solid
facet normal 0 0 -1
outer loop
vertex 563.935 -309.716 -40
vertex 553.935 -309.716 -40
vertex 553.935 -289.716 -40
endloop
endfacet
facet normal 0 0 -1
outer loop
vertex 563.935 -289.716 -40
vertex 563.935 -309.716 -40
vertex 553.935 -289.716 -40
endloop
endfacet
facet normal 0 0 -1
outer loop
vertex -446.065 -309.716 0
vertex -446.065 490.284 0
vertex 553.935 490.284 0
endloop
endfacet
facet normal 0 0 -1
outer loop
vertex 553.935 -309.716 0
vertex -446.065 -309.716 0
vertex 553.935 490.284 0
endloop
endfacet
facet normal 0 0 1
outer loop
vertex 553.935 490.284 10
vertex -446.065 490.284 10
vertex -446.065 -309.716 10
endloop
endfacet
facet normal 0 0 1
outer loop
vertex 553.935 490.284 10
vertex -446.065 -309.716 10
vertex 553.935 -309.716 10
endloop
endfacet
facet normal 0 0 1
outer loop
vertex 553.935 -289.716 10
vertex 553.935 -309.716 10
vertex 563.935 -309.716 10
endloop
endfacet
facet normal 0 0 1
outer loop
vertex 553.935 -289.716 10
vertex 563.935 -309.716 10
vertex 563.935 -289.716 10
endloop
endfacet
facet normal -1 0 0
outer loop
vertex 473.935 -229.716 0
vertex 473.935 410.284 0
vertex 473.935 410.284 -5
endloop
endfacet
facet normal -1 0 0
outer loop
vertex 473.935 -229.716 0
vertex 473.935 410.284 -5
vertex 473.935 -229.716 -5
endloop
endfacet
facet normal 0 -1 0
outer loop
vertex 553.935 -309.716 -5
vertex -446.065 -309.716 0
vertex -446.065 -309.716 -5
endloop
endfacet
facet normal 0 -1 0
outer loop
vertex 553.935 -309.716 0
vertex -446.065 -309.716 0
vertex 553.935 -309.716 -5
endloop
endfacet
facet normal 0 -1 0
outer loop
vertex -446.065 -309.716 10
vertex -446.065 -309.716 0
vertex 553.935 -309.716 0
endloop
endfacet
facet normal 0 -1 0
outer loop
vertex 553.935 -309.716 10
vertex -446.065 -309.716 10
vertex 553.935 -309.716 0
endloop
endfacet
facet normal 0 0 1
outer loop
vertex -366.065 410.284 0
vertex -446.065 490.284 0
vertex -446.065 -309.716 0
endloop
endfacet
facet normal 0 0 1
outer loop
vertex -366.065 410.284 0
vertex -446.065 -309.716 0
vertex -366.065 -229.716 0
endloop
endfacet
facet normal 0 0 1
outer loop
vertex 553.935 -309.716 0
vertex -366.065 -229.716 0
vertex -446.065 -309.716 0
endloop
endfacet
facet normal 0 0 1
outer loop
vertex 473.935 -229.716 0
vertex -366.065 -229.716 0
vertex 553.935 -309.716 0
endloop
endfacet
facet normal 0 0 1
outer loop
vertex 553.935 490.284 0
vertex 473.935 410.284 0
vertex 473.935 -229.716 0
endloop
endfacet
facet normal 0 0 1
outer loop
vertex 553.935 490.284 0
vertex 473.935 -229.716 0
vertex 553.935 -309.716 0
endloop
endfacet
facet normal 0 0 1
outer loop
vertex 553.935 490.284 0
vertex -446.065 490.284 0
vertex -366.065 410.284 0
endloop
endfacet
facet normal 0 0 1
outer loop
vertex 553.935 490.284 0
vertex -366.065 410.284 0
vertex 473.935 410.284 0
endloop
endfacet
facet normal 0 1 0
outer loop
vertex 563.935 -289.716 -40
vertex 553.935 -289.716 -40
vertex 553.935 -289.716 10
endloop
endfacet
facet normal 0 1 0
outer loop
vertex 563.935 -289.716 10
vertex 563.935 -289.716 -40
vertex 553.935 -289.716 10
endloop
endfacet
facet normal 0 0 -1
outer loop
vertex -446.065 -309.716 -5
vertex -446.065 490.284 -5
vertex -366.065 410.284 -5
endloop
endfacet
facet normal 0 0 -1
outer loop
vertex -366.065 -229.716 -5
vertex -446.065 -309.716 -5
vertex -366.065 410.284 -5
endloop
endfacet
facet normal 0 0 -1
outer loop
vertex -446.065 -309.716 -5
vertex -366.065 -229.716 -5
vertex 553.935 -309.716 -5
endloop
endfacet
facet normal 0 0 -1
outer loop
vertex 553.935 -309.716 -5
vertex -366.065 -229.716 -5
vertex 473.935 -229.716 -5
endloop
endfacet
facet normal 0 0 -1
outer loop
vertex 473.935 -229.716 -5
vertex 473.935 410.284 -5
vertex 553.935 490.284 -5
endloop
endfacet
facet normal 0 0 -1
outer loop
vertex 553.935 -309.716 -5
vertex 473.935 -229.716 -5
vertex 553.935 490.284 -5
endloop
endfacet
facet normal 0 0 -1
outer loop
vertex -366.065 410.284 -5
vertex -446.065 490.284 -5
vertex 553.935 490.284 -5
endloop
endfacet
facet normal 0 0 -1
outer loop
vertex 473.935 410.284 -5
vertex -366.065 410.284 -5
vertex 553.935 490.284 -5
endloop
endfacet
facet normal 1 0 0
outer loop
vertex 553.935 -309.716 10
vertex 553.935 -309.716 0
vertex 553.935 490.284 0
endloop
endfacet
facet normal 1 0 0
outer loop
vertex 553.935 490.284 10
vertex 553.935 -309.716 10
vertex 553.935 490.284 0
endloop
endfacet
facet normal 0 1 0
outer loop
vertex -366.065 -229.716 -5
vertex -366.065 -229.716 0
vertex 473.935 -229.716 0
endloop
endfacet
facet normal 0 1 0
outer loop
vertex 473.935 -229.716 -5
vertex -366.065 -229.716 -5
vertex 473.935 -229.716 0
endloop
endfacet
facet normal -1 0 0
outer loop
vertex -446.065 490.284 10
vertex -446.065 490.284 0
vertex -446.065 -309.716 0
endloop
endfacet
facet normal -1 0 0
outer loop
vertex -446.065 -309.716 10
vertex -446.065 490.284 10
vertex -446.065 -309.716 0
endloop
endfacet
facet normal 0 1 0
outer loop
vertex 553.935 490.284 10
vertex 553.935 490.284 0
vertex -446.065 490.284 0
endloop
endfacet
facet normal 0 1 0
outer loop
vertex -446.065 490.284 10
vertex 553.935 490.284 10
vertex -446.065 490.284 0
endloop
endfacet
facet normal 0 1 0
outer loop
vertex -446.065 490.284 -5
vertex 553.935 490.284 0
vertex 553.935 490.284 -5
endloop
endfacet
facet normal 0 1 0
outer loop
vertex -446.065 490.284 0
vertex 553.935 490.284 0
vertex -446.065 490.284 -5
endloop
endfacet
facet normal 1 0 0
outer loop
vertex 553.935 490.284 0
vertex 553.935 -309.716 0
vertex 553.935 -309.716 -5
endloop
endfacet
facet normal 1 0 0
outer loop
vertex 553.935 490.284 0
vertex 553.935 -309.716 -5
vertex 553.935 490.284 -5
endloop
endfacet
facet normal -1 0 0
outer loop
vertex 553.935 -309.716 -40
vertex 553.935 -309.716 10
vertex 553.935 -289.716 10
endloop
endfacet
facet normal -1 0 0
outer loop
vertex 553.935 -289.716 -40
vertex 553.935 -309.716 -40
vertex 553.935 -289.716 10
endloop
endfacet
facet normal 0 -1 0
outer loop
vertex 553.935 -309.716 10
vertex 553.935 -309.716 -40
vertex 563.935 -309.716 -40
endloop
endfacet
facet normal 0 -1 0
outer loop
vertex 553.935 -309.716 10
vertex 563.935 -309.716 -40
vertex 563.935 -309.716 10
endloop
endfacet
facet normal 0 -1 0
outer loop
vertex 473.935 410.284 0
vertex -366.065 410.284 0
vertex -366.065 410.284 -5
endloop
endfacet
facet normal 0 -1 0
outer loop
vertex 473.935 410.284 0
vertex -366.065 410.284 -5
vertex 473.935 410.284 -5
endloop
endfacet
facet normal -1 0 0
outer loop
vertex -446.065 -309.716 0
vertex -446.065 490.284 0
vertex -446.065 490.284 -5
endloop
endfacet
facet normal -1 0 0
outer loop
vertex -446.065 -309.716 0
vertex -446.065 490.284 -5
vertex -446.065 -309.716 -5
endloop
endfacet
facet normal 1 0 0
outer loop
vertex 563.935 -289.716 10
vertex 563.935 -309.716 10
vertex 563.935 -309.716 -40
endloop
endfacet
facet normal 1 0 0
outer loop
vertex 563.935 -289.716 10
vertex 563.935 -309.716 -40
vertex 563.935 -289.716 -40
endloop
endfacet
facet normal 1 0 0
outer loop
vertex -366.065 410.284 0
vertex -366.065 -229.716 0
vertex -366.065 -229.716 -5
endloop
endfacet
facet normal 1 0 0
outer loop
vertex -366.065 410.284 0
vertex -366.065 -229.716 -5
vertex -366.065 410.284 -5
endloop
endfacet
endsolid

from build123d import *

# Parameters (mm, degrees)
F0_W     = 840
F0_H     = 80
F0_H_2   = 640
F1_DEPTH = 10
F2_DEPTH = 5
F3_W     = 20
F3_H     = 50
F4_DEPTH = 10


# Not quite as in the source:
# - a feature names something its author has since deleted; it is built from what else it names


with BuildPart() as f1:
    # F0 (on Top) → F1 (new body)
    with BuildSketch(Plane.XY):
        Polygon((-446.064549312, 490.2843640471), (-446.064549312, -309.7156359529), (-366.064549312, -309.7156359529), (-366.064549312, -229.7156359529), (-366.064549312, 410.2843640471), (-366.064549312, 490.2843640471), align=None)
        with Locations((53.935450688, -269.7156359529)):
            Rectangle(F0_W, F0_H)
        Polygon((473.935450688, -229.7156359529), (473.935450688, -309.7156359529), (553.935450688, -309.7156359529), (553.935450688, 490.2843640471), (473.935450688, 490.2843640471), (473.935450688, 410.2843640471), align=None)
        with Locations((53.935450688, 90.2843640471)):
            Rectangle(F0_W, F0_H_2)
        with Locations((53.935450688, 450.2843640471)):
            Rectangle(F0_W, F0_H)
    extrude(amount=F1_DEPTH)


with BuildPart() as f2:
    # F0 (on Top) → F2 (new body)
    with BuildSketch(Plane.XY):
        Polygon((-446.064549312, 490.2843640471), (-446.064549312, -309.7156359529), (-366.064549312, -309.7156359529), (-366.064549312, -229.7156359529), (-366.064549312, 410.2843640471), (-366.064549312, 490.2843640471), align=None)
        with Locations((53.935450688, 450.2843640471)):
            Rectangle(F0_W, F0_H)
        with Locations((53.935450688, -269.7156359529)):
            Rectangle(F0_W, F0_H)
        Polygon((473.935450688, -229.7156359529), (473.935450688, -309.7156359529), (553.935450688, -309.7156359529), (553.935450688, 490.2843640471), (473.935450688, 490.2843640471), (473.935450688, 410.2843640471), align=None)
    extrude(amount=-F2_DEPTH)


with BuildPart() as f4:
    # F3 (on face) → F4 (new body)
    with BuildSketch(Plane.YZ.offset(553.935450688)):
        with Locations((-299.7156359529, -15)):
            Rectangle(F3_W, F3_H)
    extrude(amount=F4_DEPTH)


solid = Compound([f1.part, f2.part, f4.part])
